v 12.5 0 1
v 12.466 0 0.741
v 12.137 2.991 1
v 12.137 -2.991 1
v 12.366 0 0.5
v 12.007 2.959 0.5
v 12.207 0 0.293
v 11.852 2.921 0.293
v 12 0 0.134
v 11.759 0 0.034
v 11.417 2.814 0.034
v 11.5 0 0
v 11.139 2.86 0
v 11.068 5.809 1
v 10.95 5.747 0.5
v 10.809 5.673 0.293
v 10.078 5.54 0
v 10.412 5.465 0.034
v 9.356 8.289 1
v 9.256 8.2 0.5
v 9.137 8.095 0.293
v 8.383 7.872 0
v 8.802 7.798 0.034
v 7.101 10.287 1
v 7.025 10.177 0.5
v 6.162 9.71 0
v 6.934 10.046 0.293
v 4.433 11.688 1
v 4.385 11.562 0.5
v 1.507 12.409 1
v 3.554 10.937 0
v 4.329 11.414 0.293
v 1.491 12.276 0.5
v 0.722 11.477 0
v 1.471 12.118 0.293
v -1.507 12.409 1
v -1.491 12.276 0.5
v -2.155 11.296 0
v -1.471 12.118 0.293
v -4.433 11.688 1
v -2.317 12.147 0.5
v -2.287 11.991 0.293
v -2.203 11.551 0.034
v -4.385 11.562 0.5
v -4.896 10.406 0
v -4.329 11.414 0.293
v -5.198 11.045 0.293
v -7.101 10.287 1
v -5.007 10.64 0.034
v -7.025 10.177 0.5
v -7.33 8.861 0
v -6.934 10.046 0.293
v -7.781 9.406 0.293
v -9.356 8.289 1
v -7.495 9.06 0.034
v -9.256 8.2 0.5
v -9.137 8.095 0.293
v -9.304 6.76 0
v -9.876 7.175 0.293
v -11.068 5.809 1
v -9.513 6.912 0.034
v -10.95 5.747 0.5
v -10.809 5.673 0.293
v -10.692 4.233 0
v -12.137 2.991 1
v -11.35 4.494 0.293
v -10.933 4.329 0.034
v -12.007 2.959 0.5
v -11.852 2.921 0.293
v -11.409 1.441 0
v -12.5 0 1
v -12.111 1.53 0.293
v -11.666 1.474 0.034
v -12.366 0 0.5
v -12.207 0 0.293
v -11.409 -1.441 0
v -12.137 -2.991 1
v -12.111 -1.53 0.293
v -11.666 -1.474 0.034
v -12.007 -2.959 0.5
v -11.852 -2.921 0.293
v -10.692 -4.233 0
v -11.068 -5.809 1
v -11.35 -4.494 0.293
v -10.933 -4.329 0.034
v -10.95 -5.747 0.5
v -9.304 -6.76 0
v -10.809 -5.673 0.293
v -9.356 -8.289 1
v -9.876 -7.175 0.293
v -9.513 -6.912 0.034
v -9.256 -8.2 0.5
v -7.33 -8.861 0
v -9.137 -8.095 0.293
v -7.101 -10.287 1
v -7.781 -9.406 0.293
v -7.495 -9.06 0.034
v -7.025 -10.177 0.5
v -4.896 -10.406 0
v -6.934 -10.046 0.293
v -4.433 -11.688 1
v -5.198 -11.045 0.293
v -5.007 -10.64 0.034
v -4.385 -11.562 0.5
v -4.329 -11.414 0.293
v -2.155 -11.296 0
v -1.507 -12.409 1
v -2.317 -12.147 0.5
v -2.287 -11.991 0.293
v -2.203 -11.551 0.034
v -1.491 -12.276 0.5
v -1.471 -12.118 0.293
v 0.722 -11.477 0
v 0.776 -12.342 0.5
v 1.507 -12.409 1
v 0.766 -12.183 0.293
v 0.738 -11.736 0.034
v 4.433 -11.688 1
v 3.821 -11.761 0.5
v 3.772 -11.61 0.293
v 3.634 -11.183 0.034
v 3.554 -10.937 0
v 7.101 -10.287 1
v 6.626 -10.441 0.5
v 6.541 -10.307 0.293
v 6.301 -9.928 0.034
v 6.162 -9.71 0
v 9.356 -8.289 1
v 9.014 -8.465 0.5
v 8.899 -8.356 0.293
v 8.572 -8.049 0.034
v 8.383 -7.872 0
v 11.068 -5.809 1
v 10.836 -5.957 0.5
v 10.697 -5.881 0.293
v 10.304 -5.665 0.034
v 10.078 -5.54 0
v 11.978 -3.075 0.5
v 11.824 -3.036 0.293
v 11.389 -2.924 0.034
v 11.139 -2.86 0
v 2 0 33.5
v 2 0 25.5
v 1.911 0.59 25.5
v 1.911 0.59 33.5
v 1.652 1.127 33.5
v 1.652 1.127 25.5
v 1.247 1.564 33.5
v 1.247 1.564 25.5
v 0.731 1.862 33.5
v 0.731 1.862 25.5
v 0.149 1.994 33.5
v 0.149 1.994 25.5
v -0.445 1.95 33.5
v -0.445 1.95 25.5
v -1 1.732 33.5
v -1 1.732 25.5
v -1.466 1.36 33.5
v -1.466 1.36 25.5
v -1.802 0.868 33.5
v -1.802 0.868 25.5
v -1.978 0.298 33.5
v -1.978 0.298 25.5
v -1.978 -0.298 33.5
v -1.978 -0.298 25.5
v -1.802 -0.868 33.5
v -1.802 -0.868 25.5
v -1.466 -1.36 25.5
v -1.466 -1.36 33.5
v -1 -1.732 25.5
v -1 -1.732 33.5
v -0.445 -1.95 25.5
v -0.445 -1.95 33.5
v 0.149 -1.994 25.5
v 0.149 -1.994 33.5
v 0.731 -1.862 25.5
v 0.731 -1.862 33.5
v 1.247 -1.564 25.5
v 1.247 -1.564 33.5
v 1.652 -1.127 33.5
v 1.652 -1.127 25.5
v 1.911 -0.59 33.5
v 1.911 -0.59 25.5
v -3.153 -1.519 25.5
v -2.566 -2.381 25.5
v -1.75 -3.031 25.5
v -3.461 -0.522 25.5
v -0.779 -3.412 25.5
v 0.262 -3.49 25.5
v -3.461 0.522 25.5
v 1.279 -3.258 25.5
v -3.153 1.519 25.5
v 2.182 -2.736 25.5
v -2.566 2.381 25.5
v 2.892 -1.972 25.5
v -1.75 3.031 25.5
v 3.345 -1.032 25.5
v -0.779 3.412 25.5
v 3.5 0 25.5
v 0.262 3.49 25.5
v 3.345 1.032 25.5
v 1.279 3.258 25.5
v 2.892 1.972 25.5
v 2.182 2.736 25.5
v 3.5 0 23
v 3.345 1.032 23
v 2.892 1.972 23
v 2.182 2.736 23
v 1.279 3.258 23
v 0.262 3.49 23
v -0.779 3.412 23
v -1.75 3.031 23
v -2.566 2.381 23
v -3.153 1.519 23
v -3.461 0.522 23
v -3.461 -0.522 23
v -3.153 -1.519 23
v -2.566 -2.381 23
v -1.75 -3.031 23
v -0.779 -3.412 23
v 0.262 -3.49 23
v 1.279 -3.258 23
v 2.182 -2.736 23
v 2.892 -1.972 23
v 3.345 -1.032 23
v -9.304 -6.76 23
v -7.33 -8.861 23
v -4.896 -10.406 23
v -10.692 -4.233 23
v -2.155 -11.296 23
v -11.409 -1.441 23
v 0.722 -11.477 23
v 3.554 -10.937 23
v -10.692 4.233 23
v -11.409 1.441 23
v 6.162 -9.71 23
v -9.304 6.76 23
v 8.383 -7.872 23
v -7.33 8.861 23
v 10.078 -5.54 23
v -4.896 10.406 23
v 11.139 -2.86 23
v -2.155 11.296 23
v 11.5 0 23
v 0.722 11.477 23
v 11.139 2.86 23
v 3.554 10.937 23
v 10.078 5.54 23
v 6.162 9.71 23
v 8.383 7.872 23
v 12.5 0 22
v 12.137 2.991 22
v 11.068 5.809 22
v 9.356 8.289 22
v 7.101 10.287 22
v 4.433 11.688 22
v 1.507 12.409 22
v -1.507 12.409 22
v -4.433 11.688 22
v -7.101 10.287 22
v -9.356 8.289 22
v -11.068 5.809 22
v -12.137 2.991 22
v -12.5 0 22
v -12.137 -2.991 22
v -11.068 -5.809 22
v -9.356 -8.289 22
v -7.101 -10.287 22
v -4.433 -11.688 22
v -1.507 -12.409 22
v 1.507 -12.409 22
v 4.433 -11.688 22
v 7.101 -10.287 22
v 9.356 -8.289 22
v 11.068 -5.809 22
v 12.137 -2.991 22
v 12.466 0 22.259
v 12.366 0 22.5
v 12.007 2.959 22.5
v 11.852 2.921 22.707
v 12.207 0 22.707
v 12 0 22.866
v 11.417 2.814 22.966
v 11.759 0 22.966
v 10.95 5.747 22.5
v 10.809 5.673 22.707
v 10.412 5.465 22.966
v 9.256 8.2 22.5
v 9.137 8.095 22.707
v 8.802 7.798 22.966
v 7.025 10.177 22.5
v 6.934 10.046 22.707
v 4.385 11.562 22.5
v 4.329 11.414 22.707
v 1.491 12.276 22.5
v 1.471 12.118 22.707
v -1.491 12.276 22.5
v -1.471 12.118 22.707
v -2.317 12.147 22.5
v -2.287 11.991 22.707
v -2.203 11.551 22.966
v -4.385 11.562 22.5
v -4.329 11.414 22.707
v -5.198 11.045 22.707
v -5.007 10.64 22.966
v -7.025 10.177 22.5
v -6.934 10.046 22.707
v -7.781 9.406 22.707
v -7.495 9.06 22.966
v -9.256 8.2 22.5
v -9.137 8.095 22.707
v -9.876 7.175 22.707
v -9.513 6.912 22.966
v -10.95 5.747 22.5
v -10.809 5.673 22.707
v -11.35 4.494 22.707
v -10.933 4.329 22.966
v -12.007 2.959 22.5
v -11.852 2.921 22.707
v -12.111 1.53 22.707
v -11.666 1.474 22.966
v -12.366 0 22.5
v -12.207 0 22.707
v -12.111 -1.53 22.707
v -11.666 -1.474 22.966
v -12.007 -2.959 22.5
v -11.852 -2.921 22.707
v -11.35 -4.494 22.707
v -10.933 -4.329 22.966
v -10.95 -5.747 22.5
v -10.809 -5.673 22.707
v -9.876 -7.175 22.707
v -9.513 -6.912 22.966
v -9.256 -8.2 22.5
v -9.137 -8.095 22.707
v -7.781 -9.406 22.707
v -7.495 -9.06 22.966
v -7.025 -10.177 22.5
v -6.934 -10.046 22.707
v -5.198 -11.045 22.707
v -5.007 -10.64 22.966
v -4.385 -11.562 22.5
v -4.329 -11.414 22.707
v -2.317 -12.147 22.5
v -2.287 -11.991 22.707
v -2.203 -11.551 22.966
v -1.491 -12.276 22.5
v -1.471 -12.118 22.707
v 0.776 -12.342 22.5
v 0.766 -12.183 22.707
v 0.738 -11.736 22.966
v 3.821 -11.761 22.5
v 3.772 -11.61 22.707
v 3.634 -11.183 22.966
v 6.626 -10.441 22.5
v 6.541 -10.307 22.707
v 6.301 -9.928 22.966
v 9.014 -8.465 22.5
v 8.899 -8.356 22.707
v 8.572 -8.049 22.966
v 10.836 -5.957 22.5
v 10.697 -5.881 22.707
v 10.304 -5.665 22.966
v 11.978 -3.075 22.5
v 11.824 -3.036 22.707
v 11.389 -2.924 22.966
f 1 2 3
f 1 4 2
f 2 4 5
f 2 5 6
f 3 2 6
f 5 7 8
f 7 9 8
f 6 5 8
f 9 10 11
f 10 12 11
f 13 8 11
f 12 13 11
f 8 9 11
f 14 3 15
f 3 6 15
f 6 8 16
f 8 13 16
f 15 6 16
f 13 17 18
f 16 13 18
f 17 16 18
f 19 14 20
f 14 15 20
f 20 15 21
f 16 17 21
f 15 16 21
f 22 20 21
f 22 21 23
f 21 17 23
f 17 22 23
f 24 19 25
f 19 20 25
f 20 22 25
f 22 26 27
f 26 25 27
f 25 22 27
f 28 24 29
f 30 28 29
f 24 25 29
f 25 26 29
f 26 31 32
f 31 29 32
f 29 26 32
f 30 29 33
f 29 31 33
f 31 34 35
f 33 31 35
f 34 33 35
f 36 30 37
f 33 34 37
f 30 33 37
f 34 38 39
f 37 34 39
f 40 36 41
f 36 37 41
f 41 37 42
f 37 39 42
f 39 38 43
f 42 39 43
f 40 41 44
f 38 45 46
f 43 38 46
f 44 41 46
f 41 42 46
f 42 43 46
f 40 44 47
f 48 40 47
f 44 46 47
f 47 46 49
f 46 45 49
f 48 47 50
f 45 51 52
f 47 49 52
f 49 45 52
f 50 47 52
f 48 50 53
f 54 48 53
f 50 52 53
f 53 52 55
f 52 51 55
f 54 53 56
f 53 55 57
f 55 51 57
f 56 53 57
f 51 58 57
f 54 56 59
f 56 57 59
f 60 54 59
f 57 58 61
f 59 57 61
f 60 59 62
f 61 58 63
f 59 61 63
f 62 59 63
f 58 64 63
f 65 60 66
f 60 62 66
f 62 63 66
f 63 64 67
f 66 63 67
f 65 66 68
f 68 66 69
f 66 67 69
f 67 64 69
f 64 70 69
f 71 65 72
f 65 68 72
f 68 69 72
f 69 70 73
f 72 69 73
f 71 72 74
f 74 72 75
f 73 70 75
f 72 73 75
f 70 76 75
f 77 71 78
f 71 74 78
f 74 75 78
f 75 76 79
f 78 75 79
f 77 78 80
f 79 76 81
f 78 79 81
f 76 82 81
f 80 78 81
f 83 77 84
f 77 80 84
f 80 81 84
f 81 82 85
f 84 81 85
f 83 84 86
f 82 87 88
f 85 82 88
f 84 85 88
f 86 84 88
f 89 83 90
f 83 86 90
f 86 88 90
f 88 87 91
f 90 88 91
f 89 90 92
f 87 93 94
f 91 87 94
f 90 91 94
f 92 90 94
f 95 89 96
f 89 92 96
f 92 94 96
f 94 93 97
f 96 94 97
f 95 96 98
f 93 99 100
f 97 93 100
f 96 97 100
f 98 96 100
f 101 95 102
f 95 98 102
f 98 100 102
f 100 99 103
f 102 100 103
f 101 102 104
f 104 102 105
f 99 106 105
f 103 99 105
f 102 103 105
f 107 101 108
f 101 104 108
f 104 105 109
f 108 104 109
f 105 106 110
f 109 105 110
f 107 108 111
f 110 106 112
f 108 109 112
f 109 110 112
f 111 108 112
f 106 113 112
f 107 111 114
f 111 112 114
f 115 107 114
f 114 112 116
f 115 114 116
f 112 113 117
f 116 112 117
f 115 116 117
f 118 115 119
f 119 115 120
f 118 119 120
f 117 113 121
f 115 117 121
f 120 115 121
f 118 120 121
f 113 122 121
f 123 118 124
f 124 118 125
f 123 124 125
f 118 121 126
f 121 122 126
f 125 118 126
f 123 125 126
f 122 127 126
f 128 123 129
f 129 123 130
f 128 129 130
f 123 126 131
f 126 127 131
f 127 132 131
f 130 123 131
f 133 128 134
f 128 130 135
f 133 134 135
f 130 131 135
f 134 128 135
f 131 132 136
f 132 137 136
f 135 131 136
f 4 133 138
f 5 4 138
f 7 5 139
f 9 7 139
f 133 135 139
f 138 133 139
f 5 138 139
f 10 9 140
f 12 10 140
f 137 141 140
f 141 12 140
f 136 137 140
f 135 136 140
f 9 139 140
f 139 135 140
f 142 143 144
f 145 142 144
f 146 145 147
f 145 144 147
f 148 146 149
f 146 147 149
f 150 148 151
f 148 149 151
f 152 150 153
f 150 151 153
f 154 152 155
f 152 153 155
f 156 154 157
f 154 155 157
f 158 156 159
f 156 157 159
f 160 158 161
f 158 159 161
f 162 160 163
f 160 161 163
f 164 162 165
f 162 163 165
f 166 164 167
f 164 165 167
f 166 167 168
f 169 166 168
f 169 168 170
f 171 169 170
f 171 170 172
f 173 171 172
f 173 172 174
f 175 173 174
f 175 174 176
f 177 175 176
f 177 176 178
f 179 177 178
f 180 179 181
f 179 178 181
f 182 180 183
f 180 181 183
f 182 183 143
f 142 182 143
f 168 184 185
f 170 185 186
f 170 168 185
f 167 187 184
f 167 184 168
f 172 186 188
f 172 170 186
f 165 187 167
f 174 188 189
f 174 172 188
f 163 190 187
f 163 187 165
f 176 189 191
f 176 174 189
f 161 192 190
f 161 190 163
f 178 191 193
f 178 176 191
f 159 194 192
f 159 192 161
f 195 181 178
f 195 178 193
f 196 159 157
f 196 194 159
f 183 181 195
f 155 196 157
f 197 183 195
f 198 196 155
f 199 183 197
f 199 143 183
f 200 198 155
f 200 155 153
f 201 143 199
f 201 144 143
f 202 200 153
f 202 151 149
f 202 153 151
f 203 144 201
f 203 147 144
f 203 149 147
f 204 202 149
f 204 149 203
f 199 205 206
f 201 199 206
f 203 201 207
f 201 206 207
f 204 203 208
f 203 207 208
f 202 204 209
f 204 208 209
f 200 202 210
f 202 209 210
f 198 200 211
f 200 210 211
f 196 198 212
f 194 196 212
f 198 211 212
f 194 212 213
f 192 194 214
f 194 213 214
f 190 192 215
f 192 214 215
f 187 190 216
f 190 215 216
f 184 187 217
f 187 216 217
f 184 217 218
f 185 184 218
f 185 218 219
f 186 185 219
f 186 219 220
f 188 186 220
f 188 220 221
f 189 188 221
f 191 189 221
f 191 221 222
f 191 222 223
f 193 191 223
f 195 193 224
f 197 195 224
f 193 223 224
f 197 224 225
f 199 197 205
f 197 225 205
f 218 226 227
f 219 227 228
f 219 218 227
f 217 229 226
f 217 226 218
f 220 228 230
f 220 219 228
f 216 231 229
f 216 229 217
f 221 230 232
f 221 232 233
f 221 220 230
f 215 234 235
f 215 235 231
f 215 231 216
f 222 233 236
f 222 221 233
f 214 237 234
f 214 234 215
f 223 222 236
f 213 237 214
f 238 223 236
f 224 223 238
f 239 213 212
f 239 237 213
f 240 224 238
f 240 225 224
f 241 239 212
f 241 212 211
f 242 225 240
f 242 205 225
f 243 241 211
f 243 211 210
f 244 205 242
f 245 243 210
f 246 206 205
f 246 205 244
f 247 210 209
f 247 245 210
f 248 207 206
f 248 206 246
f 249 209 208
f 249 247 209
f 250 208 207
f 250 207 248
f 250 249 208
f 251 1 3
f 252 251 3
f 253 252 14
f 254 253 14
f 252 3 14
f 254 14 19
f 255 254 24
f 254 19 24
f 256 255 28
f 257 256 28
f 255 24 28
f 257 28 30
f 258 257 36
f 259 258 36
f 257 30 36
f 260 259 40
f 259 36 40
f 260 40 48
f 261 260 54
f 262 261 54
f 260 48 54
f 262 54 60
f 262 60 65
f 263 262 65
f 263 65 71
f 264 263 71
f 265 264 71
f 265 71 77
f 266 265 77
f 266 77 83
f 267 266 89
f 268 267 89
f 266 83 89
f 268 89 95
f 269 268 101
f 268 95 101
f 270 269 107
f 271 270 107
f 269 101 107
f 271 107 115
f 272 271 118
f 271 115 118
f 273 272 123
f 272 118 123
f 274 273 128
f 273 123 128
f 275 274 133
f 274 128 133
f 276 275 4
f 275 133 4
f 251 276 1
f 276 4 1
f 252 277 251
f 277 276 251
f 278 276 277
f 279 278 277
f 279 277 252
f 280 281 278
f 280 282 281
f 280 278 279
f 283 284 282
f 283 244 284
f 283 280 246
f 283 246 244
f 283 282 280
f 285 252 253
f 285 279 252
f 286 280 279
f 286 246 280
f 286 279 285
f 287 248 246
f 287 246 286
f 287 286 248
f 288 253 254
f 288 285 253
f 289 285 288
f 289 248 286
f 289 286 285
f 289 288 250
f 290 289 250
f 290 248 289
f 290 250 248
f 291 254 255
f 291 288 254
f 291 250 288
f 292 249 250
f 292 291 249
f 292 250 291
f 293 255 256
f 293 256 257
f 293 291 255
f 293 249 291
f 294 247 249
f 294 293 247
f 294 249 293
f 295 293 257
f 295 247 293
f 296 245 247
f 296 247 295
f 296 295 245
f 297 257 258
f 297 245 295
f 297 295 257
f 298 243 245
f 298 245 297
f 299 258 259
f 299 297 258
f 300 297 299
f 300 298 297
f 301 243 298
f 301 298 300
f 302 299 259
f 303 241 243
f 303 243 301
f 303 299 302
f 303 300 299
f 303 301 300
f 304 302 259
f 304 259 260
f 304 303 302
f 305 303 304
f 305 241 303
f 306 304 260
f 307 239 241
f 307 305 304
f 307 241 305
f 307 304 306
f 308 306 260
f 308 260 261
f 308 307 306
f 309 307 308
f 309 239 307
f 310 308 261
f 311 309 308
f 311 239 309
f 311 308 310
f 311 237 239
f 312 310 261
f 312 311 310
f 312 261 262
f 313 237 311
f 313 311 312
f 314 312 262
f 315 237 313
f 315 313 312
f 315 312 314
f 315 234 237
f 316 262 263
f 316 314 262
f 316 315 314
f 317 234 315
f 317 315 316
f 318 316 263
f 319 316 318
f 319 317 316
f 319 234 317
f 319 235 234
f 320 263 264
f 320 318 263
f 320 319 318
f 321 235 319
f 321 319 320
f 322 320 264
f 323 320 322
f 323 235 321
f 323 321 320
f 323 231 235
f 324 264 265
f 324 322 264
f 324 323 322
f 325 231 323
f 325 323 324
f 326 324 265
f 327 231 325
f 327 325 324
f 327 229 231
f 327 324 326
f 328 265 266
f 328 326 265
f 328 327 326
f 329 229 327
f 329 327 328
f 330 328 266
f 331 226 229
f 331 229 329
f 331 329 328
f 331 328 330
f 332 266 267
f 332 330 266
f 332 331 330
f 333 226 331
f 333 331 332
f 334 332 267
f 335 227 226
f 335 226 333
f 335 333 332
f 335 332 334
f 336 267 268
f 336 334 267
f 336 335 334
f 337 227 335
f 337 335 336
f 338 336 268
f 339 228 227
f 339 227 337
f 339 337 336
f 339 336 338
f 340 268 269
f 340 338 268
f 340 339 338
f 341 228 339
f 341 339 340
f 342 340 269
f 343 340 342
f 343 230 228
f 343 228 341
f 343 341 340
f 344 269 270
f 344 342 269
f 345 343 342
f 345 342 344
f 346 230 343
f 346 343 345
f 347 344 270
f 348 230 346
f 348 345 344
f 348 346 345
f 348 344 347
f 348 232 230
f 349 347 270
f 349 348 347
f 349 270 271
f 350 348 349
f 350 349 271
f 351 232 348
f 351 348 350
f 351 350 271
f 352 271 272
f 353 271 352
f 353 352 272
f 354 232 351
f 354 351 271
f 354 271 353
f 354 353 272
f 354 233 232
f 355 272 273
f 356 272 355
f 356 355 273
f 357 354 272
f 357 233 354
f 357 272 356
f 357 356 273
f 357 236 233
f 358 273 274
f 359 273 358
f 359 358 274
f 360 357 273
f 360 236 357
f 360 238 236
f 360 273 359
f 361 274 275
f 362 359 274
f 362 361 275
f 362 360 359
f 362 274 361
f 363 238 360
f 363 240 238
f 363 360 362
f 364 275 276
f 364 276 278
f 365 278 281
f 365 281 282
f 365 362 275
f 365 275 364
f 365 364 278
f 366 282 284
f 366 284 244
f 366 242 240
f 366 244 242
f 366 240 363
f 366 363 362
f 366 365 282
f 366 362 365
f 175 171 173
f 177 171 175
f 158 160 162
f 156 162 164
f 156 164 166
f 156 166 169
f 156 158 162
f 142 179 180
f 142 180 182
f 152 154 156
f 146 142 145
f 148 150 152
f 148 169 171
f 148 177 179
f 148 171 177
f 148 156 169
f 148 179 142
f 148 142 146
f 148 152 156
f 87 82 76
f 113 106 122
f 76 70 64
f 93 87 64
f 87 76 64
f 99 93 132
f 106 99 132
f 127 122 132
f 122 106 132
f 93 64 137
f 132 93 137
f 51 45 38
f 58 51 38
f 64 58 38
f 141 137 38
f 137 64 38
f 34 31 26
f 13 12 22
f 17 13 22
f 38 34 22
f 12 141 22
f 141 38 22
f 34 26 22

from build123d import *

# Parameters (mm, degrees)
ESBO_O1_R                = 12.5
RESSALTO_EXTRUS_O1_DEPTH = 23
ESBO_O2_R                = 3.5
RESSALTO_EXTRUS_O2_DEPTH = 2.5
FILETE1_R                = 1
ESBO_O3_R                = 2
RESSALTO_EXTRUS_O3_DEPTH = 8


with BuildPart() as part:
    # Esboço1 → Ressalto-extrusão1 (new body)
    with BuildSketch(Plane.XY):
        Circle(ESBO_O1_R)
    extrude(amount=RESSALTO_EXTRUS_O1_DEPTH)

    # Esboço2 → Ressalto-extrusão2 (add)
    with BuildSketch(Plane.XY.offset(23)):
        Circle(ESBO_O2_R)
    extrude(amount=RESSALTO_EXTRUS_O2_DEPTH)

    # Filete1
    filete1_edges = [part.edges().sort_by_distance(p)[0] for p in [
        (-12.5, 0, 0),
        (-12.5, 0, 23),
    ]]
    fillet(filete1_edges, radius=FILETE1_R)

    # Esboço3 → Ressalto-extrusão3 (add)
    with BuildSketch(Plane.XY.offset(25.5)):
        Circle(ESBO_O3_R)
    extrude(amount=RESSALTO_EXTRUS_O3_DEPTH)


solid = part.part
